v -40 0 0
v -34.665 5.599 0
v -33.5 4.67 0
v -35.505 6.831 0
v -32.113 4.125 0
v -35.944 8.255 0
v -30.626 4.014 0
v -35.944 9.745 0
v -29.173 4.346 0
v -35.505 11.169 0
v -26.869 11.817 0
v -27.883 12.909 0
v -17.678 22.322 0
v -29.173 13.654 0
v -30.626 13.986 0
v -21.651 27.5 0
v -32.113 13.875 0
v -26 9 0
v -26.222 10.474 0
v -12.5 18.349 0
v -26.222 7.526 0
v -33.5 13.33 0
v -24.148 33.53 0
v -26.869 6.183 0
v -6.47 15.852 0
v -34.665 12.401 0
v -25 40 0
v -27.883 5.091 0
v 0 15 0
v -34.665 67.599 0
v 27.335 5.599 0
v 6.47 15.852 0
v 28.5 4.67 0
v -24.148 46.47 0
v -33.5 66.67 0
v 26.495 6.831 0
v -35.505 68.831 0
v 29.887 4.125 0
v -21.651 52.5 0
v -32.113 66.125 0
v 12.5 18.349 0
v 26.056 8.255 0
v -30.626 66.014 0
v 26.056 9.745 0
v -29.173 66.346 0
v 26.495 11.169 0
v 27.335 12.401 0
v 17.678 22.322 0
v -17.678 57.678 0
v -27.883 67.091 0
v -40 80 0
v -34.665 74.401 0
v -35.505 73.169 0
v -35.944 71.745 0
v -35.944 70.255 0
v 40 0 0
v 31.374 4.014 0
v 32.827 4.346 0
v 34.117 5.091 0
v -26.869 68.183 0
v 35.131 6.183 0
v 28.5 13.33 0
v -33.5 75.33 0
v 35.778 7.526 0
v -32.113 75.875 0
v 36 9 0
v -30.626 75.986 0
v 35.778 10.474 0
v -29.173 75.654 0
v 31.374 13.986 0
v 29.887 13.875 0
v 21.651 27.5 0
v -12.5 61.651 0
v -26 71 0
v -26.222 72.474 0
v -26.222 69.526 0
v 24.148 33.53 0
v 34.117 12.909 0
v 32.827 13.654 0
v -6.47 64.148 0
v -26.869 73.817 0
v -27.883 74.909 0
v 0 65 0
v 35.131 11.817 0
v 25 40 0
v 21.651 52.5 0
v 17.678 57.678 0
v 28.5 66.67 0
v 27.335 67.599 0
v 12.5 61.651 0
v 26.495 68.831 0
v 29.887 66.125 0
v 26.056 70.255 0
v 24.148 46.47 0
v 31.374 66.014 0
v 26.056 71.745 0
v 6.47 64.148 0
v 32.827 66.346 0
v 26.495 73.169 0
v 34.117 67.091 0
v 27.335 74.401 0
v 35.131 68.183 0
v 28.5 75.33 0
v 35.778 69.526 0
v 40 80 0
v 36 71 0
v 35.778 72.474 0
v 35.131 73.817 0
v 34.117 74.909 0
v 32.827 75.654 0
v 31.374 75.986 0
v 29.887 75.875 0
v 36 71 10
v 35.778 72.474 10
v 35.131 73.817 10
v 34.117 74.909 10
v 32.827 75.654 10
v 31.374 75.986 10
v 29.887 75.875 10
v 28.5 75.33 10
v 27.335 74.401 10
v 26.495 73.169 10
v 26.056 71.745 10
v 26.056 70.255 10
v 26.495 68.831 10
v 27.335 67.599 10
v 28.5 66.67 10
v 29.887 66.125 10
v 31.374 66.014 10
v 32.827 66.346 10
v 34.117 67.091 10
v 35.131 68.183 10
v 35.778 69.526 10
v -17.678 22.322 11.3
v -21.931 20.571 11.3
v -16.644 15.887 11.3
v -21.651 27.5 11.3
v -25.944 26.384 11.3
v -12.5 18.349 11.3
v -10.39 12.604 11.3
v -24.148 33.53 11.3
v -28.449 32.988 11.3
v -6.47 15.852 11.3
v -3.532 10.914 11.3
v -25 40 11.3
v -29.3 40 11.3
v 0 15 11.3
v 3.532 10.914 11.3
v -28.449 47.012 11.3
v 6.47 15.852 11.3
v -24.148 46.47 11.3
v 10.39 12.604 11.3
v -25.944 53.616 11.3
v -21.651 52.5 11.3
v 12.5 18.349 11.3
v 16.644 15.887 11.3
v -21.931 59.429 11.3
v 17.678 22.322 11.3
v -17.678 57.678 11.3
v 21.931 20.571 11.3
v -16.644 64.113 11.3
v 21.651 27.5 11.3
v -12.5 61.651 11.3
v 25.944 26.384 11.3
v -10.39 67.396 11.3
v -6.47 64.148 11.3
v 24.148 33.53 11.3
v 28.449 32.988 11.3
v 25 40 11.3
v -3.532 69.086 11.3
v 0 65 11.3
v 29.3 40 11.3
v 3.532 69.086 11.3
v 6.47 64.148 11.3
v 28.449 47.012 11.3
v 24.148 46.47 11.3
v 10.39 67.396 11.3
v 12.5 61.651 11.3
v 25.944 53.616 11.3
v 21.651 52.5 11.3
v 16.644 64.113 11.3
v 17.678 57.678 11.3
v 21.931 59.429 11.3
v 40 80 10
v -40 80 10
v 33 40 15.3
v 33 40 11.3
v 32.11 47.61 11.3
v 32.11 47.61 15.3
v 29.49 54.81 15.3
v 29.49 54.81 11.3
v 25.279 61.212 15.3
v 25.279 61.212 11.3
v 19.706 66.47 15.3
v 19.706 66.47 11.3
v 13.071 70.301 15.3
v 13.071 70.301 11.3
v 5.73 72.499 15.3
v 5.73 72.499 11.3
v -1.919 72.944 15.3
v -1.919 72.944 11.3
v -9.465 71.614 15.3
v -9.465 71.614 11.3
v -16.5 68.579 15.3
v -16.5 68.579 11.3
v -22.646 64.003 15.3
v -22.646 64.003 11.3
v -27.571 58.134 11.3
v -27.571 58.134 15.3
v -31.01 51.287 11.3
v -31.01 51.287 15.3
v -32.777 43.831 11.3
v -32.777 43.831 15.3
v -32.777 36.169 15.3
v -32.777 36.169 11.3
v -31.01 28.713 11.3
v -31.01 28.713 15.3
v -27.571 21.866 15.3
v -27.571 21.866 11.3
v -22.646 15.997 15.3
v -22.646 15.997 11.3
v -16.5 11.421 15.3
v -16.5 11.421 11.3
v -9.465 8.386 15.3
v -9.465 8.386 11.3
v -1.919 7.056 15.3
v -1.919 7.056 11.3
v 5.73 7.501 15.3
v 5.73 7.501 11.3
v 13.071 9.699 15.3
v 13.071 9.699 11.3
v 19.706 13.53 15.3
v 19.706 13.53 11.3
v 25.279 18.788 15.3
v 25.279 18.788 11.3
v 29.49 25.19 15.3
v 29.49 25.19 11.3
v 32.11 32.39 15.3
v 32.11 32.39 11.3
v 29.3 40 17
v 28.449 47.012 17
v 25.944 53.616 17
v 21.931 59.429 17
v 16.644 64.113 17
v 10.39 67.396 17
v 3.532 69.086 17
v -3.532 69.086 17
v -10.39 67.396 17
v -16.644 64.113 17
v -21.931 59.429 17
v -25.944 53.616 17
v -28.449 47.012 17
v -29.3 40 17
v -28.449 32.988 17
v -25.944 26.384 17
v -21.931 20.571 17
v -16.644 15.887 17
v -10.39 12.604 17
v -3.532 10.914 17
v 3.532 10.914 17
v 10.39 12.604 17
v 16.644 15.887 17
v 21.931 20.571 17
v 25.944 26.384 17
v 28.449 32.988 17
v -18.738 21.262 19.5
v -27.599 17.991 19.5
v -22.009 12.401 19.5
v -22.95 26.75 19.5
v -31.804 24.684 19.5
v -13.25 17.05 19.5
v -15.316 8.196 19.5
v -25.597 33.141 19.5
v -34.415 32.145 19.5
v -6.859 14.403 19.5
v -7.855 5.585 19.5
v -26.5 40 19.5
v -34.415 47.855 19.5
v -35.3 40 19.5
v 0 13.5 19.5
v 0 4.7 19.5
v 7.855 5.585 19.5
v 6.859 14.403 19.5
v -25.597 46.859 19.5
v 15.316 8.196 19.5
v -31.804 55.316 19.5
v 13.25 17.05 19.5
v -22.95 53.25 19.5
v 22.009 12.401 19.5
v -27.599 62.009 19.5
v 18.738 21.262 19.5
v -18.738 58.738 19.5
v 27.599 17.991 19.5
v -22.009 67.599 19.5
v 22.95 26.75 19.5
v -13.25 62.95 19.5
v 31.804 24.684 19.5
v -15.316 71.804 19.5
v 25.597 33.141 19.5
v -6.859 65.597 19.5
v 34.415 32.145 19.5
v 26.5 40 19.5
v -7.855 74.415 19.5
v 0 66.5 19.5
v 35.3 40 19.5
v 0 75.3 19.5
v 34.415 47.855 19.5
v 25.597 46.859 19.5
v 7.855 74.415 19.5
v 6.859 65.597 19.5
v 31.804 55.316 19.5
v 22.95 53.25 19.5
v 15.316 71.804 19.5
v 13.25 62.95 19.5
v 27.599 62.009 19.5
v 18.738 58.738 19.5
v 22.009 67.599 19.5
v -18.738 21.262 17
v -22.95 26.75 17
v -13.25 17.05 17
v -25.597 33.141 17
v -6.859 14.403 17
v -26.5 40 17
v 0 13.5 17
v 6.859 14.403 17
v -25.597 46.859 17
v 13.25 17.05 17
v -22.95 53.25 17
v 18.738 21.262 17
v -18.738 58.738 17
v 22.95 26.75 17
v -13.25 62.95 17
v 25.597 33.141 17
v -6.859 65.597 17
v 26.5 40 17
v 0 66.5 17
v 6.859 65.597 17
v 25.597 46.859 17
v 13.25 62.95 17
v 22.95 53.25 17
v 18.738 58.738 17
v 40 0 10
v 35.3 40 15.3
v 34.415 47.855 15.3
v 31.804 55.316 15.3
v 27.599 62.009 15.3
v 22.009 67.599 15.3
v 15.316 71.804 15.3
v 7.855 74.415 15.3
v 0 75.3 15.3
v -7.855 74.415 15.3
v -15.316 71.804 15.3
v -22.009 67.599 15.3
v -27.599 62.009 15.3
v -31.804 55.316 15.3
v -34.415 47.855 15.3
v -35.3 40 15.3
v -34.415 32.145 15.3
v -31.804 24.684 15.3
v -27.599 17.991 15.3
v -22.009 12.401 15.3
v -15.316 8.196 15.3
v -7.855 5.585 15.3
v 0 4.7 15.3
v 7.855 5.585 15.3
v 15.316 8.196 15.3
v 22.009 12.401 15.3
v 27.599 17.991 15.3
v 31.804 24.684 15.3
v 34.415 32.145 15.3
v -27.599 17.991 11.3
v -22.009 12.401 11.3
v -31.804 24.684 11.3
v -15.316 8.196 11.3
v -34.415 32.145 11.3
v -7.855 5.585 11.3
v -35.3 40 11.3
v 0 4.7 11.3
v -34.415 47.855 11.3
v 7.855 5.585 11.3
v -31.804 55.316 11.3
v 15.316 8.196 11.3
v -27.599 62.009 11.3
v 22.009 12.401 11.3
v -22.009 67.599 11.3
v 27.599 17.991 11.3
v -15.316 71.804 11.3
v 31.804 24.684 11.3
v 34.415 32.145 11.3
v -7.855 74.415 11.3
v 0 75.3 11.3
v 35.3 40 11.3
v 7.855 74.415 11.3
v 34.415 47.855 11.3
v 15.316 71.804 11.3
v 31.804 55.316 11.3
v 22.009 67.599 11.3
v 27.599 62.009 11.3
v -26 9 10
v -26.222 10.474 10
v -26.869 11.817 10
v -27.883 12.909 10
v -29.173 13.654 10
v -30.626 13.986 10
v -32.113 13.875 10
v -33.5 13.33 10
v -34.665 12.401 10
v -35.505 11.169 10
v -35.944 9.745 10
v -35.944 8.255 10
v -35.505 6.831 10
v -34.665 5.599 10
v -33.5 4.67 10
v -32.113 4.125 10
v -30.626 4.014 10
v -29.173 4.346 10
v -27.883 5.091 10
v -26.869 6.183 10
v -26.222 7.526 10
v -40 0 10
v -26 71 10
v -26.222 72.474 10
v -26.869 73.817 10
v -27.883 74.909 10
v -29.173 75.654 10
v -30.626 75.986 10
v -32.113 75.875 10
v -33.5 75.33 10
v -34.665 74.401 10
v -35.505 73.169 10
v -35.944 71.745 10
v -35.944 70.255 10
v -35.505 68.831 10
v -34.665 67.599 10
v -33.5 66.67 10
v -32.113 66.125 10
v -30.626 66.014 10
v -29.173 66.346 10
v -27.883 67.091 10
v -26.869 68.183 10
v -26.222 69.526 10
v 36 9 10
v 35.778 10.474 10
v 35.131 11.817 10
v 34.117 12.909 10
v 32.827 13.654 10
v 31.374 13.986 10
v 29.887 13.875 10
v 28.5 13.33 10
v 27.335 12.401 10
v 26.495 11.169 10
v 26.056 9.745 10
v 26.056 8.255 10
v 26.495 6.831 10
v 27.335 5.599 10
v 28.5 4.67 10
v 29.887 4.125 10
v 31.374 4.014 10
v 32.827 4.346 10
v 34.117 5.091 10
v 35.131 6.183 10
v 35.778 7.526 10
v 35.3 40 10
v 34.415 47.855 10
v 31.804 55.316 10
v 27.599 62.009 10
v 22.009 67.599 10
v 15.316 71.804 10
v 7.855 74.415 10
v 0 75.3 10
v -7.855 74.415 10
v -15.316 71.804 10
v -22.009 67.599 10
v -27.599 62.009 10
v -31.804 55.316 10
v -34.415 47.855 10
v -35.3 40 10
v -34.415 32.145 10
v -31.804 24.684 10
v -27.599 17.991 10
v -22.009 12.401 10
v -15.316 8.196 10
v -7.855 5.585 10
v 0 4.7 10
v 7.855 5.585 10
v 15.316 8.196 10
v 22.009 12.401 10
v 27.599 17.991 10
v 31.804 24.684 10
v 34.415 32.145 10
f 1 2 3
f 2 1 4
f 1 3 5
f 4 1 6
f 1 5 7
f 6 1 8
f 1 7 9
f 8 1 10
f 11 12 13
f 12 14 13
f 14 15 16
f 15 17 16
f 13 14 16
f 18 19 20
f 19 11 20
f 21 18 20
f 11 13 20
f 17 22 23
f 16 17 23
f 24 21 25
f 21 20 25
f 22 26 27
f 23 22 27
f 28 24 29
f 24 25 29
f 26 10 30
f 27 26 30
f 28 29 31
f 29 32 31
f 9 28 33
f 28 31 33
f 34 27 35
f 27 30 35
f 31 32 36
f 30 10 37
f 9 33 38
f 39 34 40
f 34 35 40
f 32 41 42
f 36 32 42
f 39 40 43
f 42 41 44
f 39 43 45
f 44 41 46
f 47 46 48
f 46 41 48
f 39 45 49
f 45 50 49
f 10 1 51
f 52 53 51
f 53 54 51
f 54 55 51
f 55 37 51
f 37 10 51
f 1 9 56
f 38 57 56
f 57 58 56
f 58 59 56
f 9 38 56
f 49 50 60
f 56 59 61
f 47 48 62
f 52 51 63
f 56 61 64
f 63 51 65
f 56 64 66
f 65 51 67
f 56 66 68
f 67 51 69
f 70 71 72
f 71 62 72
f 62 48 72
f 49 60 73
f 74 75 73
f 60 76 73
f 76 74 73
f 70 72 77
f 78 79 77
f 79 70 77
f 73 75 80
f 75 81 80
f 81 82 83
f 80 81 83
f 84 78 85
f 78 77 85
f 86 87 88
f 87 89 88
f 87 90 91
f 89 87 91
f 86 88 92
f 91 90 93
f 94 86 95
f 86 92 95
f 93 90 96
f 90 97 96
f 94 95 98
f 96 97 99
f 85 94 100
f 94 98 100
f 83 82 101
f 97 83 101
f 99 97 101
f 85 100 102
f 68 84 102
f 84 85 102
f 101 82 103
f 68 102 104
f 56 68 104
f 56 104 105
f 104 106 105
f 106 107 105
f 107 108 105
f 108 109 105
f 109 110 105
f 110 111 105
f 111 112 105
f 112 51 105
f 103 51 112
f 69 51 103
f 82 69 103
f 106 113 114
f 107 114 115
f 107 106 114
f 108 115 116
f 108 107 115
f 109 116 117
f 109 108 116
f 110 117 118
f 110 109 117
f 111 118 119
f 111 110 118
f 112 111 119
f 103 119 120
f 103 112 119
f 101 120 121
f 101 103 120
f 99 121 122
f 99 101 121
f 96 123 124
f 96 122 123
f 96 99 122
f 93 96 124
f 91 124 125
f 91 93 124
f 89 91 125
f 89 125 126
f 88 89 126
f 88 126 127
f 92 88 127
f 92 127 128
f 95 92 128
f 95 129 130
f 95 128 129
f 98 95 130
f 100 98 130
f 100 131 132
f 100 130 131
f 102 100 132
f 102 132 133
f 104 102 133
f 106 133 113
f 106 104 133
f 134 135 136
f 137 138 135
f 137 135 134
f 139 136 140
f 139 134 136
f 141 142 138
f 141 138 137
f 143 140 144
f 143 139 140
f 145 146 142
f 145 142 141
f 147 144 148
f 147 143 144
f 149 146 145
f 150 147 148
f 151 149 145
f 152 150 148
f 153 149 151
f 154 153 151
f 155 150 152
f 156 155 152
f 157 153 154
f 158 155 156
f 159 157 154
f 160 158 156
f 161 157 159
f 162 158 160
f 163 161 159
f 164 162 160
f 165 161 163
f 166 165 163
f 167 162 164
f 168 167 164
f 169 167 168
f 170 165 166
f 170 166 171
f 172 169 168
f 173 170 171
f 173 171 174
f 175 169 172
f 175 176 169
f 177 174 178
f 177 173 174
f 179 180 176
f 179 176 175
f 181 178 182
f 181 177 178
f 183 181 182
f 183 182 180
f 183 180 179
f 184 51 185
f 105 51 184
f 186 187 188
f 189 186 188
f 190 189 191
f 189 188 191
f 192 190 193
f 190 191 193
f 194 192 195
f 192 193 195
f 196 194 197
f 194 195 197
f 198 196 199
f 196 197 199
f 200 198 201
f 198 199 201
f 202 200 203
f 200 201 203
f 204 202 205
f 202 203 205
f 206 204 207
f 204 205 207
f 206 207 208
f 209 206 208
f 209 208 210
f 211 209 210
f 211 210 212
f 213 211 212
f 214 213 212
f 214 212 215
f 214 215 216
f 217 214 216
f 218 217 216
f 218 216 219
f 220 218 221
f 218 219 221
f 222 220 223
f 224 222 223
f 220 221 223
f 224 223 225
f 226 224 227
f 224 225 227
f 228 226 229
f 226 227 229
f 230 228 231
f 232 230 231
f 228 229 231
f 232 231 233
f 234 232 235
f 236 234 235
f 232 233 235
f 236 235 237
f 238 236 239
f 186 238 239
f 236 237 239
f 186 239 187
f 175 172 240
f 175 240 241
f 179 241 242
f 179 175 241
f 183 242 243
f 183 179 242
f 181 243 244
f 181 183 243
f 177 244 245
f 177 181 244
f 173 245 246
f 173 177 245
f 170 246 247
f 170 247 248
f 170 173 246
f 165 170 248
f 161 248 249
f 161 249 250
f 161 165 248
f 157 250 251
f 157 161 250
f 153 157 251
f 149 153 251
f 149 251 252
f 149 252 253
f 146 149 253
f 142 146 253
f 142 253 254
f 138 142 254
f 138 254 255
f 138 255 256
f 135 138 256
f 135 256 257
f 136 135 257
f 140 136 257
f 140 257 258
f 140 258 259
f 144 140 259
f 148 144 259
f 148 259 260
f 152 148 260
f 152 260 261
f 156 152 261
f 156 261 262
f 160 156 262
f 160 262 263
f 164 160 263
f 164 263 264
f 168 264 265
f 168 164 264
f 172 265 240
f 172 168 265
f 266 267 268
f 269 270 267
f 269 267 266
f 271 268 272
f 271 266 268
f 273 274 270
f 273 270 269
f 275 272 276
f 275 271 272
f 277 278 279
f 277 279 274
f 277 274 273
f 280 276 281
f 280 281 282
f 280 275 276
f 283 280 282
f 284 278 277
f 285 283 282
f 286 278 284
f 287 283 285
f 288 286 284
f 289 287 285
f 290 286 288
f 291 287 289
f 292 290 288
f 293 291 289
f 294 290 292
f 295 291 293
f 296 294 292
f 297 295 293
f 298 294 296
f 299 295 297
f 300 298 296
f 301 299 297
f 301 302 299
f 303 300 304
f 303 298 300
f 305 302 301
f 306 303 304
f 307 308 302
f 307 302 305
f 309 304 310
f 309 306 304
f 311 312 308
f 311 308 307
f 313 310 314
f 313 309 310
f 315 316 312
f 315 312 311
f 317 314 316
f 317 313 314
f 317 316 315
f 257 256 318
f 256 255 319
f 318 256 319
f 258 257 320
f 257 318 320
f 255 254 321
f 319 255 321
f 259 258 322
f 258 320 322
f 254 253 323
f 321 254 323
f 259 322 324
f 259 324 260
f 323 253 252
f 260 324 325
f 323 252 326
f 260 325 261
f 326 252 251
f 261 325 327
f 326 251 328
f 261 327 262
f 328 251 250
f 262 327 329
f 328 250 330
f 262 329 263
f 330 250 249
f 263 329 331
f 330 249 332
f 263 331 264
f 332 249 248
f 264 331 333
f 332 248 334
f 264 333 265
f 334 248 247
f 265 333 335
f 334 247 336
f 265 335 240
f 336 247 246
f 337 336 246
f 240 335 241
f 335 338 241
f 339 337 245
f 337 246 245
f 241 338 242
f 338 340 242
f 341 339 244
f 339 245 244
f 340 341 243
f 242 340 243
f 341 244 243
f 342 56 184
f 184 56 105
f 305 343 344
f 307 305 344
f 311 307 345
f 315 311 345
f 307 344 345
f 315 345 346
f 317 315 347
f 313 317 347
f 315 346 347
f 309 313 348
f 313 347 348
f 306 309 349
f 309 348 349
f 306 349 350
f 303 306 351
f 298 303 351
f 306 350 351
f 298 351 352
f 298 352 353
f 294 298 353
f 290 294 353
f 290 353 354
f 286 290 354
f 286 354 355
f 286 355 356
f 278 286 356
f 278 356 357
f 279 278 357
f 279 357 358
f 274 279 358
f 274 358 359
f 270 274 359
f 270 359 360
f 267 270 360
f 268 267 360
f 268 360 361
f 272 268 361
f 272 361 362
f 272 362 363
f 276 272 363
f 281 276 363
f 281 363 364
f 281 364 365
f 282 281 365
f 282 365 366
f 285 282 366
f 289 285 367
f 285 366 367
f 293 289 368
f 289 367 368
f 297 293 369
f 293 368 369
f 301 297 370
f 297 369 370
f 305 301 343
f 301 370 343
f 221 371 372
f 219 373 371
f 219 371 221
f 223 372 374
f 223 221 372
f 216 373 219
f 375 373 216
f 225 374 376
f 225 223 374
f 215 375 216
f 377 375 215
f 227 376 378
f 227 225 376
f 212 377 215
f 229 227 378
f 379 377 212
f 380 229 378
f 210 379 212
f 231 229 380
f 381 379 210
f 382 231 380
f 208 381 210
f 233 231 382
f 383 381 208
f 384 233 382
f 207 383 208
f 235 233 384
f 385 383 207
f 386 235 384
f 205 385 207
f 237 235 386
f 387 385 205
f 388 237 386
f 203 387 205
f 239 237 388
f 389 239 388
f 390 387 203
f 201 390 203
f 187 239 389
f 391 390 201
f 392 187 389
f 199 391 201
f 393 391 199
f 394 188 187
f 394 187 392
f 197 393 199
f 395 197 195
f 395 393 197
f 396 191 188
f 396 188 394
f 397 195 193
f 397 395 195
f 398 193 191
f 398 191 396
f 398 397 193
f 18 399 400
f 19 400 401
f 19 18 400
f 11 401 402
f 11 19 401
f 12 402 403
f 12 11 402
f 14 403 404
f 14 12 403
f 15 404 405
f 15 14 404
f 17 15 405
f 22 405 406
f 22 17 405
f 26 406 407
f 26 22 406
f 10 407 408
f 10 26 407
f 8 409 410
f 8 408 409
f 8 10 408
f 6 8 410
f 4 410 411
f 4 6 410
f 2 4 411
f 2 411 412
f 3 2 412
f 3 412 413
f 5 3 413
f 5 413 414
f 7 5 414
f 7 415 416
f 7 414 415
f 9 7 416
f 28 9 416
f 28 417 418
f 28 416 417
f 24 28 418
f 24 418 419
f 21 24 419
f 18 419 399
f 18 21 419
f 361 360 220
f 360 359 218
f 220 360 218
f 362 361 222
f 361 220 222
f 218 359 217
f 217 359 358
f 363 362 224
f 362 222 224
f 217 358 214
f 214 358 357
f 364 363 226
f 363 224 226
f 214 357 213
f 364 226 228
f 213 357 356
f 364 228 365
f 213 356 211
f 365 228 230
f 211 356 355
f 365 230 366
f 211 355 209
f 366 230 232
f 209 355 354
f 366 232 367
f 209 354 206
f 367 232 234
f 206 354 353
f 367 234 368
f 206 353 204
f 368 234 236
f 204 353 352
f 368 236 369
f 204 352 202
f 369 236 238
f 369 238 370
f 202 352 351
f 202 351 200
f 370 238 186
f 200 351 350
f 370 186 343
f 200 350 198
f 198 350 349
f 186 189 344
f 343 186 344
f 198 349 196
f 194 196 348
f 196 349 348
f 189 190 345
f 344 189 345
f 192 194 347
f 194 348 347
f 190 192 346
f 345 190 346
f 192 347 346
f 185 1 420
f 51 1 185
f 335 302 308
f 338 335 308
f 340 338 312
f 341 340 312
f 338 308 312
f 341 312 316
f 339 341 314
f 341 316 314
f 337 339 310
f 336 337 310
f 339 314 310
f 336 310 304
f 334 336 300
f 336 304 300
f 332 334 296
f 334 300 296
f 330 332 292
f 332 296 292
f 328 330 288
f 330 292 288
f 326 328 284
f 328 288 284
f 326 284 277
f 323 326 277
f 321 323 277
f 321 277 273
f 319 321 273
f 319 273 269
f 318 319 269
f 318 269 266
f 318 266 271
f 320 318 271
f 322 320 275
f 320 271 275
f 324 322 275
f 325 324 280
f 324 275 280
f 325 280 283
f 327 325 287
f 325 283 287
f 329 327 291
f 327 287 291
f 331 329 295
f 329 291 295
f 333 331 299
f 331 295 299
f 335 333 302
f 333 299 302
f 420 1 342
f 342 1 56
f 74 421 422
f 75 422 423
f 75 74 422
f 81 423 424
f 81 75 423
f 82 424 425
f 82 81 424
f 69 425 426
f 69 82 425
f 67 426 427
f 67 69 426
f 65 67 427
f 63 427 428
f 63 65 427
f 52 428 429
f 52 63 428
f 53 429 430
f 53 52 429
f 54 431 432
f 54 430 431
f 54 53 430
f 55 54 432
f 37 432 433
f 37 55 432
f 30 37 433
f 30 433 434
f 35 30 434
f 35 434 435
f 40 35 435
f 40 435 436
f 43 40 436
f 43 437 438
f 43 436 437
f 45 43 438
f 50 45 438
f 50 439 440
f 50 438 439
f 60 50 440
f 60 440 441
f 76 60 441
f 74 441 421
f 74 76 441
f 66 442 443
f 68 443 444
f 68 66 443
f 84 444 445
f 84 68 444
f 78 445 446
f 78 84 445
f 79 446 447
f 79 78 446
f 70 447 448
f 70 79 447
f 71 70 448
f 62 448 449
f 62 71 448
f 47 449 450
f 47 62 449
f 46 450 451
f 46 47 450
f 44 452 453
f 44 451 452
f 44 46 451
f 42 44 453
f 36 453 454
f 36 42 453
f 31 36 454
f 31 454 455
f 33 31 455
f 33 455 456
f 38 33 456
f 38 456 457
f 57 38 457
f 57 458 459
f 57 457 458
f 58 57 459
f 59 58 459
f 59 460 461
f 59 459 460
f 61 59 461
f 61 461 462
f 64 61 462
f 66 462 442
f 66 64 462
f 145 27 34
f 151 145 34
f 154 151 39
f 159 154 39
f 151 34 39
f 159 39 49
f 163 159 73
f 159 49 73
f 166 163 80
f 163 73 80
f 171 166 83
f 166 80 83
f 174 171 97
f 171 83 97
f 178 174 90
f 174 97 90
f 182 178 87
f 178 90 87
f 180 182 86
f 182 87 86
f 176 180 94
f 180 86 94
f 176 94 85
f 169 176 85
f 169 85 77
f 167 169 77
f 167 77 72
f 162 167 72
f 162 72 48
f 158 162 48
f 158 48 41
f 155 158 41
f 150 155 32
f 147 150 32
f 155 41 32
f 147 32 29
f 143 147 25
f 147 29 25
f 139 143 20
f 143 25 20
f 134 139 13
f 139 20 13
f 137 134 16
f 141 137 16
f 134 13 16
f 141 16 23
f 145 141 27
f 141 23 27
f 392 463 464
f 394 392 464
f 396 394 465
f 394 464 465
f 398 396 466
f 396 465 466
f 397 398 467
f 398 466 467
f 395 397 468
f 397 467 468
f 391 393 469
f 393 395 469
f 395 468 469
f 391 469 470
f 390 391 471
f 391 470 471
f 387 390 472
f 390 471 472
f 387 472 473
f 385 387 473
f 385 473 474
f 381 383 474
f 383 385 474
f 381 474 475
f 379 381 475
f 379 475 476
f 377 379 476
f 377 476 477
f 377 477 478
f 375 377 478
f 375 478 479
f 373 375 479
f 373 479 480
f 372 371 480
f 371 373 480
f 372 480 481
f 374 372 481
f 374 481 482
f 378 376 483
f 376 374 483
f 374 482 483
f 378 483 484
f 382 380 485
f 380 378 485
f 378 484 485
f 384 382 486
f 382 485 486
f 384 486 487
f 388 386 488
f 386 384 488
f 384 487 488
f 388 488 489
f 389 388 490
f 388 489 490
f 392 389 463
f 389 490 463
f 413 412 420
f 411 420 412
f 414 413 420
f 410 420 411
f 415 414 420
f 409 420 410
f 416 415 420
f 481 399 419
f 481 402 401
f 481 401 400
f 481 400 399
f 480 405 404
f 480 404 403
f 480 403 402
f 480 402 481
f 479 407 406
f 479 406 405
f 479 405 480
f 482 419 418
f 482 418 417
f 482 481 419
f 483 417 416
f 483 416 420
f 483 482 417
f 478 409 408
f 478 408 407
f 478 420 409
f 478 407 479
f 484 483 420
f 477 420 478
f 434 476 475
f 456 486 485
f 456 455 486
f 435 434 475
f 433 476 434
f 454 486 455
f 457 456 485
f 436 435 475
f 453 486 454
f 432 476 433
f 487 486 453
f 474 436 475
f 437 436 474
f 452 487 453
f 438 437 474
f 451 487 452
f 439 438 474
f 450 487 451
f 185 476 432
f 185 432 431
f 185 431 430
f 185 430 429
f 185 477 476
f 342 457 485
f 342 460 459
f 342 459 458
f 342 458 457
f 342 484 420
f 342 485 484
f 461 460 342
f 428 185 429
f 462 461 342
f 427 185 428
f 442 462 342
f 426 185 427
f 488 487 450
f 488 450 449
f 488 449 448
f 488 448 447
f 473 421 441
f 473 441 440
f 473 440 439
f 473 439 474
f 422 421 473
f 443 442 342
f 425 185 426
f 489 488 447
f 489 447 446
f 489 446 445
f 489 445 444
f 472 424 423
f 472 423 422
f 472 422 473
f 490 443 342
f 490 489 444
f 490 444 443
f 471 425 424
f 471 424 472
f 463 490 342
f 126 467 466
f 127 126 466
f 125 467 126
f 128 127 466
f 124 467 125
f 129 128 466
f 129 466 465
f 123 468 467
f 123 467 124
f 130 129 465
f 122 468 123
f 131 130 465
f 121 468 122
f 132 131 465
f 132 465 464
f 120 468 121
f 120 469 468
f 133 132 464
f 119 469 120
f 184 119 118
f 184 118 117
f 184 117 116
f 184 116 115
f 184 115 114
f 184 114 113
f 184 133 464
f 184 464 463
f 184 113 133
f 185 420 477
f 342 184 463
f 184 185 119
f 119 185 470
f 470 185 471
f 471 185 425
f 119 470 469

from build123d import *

# Parameters (mm, degrees)
SKETCH2_W                = 80
SKETCH2_H                = 80
BOSS_EXTRUDE1_DEPTH      = 10
SKETCH3_R                = 35.3
BOSS_EXTRUDE2_DEPTH      = 9.5
SKETCH5_R                = 29.3
CUT_EXTRUDE1_DEPTH       = 5.3
SKETCH6_R                = 37.5
SKETCH6_R_2              = 33
CUT_EXTRUDE4_DEPTH       = 4
SKETCH8_R                = 26.5
CUT_EXTRUDE10_DEPTH      = 2.5
SKETCH9_R                = 29.3
CUT_EXTRUDE11_DEPTH      = 5.3
SKETCH10_R               = 25
CUT_EXTRUDE12_DEPTH      = 11.3
SKETCH11_R               = 5
CUT_EXTRUDE13_DEPTH      = 64
CUT_EXTRUDE13_DEPTH_BACK = 36.3


with BuildPart() as part:
    # Sketch2 → Boss-Extrude1 (new body)
    with BuildSketch(Plane.XY):
        with Locations((0, 40)):
            Rectangle(SKETCH2_W, SKETCH2_H)
    extrude(amount=BOSS_EXTRUDE1_DEPTH)

    # Sketch3 → Boss-Extrude2 (add)
    with BuildSketch(Plane.XY.offset(10)):
        with Locations((0, 40)):
            Circle(SKETCH3_R)
    extrude(amount=BOSS_EXTRUDE2_DEPTH)

    # Sketch5 → Cut-Extrude1 (cut)
    with BuildSketch(Plane.XY.offset(11.3)):
        with Locations((0, 40)):
            Circle(SKETCH5_R)
    extrude(amount=CUT_EXTRUDE1_DEPTH, mode=Mode.SUBTRACT)

    # Sketch6 → Cut-Extrude4 (cut)
    with BuildSketch(Plane.XY.offset(11.3)):
        with Locations((0, 40)):
            Circle(SKETCH6_R)
        with Locations((0, 40)):
            Circle(SKETCH6_R_2, mode=Mode.SUBTRACT)
    extrude(amount=CUT_EXTRUDE4_DEPTH, mode=Mode.SUBTRACT)

    # Sketch8 → Cut-Extrude10 (cut)
    with BuildSketch(Plane.XY.offset(19.5)):
        with Locations((0, 40)):
            Circle(SKETCH8_R)
    extrude(amount=-CUT_EXTRUDE10_DEPTH, mode=Mode.SUBTRACT)

    # Sketch9 → Cut-Extrude11 (cut)
    with BuildSketch(Plane.XY.offset(17)):
        with Locations((0, 40)):
            Circle(SKETCH9_R)
    extrude(amount=-CUT_EXTRUDE11_DEPTH, mode=Mode.SUBTRACT)

    # Sketch10 → Cut-Extrude12 (cut)
    with BuildSketch(Plane(origin=(0, 0, 0), x_dir=(-1, 0, 0), z_dir=(0, 0, -1))):
        with Locations((0, 40)):
            Circle(SKETCH10_R)
    extrude(amount=-CUT_EXTRUDE12_DEPTH, mode=Mode.SUBTRACT)

    # Sketch11 → Cut-Extrude13 (cut, two sides)
    with BuildSketch(Plane.XY) as cut_extrude13_sk:
        with Locations((-31, 71)):
            Circle(SKETCH11_R)
        with Locations((31, 71)):
            Circle(SKETCH11_R)
        with Locations((31, 9)):
            Circle(SKETCH11_R)
        with Locations((-31, 9)):
            Circle(SKETCH11_R)
    extrude(amount=CUT_EXTRUDE13_DEPTH, mode=Mode.SUBTRACT)
    extrude(cut_extrude13_sk.sketch, amount=-CUT_EXTRUDE13_DEPTH_BACK, mode=Mode.SUBTRACT)


solid = part.part
